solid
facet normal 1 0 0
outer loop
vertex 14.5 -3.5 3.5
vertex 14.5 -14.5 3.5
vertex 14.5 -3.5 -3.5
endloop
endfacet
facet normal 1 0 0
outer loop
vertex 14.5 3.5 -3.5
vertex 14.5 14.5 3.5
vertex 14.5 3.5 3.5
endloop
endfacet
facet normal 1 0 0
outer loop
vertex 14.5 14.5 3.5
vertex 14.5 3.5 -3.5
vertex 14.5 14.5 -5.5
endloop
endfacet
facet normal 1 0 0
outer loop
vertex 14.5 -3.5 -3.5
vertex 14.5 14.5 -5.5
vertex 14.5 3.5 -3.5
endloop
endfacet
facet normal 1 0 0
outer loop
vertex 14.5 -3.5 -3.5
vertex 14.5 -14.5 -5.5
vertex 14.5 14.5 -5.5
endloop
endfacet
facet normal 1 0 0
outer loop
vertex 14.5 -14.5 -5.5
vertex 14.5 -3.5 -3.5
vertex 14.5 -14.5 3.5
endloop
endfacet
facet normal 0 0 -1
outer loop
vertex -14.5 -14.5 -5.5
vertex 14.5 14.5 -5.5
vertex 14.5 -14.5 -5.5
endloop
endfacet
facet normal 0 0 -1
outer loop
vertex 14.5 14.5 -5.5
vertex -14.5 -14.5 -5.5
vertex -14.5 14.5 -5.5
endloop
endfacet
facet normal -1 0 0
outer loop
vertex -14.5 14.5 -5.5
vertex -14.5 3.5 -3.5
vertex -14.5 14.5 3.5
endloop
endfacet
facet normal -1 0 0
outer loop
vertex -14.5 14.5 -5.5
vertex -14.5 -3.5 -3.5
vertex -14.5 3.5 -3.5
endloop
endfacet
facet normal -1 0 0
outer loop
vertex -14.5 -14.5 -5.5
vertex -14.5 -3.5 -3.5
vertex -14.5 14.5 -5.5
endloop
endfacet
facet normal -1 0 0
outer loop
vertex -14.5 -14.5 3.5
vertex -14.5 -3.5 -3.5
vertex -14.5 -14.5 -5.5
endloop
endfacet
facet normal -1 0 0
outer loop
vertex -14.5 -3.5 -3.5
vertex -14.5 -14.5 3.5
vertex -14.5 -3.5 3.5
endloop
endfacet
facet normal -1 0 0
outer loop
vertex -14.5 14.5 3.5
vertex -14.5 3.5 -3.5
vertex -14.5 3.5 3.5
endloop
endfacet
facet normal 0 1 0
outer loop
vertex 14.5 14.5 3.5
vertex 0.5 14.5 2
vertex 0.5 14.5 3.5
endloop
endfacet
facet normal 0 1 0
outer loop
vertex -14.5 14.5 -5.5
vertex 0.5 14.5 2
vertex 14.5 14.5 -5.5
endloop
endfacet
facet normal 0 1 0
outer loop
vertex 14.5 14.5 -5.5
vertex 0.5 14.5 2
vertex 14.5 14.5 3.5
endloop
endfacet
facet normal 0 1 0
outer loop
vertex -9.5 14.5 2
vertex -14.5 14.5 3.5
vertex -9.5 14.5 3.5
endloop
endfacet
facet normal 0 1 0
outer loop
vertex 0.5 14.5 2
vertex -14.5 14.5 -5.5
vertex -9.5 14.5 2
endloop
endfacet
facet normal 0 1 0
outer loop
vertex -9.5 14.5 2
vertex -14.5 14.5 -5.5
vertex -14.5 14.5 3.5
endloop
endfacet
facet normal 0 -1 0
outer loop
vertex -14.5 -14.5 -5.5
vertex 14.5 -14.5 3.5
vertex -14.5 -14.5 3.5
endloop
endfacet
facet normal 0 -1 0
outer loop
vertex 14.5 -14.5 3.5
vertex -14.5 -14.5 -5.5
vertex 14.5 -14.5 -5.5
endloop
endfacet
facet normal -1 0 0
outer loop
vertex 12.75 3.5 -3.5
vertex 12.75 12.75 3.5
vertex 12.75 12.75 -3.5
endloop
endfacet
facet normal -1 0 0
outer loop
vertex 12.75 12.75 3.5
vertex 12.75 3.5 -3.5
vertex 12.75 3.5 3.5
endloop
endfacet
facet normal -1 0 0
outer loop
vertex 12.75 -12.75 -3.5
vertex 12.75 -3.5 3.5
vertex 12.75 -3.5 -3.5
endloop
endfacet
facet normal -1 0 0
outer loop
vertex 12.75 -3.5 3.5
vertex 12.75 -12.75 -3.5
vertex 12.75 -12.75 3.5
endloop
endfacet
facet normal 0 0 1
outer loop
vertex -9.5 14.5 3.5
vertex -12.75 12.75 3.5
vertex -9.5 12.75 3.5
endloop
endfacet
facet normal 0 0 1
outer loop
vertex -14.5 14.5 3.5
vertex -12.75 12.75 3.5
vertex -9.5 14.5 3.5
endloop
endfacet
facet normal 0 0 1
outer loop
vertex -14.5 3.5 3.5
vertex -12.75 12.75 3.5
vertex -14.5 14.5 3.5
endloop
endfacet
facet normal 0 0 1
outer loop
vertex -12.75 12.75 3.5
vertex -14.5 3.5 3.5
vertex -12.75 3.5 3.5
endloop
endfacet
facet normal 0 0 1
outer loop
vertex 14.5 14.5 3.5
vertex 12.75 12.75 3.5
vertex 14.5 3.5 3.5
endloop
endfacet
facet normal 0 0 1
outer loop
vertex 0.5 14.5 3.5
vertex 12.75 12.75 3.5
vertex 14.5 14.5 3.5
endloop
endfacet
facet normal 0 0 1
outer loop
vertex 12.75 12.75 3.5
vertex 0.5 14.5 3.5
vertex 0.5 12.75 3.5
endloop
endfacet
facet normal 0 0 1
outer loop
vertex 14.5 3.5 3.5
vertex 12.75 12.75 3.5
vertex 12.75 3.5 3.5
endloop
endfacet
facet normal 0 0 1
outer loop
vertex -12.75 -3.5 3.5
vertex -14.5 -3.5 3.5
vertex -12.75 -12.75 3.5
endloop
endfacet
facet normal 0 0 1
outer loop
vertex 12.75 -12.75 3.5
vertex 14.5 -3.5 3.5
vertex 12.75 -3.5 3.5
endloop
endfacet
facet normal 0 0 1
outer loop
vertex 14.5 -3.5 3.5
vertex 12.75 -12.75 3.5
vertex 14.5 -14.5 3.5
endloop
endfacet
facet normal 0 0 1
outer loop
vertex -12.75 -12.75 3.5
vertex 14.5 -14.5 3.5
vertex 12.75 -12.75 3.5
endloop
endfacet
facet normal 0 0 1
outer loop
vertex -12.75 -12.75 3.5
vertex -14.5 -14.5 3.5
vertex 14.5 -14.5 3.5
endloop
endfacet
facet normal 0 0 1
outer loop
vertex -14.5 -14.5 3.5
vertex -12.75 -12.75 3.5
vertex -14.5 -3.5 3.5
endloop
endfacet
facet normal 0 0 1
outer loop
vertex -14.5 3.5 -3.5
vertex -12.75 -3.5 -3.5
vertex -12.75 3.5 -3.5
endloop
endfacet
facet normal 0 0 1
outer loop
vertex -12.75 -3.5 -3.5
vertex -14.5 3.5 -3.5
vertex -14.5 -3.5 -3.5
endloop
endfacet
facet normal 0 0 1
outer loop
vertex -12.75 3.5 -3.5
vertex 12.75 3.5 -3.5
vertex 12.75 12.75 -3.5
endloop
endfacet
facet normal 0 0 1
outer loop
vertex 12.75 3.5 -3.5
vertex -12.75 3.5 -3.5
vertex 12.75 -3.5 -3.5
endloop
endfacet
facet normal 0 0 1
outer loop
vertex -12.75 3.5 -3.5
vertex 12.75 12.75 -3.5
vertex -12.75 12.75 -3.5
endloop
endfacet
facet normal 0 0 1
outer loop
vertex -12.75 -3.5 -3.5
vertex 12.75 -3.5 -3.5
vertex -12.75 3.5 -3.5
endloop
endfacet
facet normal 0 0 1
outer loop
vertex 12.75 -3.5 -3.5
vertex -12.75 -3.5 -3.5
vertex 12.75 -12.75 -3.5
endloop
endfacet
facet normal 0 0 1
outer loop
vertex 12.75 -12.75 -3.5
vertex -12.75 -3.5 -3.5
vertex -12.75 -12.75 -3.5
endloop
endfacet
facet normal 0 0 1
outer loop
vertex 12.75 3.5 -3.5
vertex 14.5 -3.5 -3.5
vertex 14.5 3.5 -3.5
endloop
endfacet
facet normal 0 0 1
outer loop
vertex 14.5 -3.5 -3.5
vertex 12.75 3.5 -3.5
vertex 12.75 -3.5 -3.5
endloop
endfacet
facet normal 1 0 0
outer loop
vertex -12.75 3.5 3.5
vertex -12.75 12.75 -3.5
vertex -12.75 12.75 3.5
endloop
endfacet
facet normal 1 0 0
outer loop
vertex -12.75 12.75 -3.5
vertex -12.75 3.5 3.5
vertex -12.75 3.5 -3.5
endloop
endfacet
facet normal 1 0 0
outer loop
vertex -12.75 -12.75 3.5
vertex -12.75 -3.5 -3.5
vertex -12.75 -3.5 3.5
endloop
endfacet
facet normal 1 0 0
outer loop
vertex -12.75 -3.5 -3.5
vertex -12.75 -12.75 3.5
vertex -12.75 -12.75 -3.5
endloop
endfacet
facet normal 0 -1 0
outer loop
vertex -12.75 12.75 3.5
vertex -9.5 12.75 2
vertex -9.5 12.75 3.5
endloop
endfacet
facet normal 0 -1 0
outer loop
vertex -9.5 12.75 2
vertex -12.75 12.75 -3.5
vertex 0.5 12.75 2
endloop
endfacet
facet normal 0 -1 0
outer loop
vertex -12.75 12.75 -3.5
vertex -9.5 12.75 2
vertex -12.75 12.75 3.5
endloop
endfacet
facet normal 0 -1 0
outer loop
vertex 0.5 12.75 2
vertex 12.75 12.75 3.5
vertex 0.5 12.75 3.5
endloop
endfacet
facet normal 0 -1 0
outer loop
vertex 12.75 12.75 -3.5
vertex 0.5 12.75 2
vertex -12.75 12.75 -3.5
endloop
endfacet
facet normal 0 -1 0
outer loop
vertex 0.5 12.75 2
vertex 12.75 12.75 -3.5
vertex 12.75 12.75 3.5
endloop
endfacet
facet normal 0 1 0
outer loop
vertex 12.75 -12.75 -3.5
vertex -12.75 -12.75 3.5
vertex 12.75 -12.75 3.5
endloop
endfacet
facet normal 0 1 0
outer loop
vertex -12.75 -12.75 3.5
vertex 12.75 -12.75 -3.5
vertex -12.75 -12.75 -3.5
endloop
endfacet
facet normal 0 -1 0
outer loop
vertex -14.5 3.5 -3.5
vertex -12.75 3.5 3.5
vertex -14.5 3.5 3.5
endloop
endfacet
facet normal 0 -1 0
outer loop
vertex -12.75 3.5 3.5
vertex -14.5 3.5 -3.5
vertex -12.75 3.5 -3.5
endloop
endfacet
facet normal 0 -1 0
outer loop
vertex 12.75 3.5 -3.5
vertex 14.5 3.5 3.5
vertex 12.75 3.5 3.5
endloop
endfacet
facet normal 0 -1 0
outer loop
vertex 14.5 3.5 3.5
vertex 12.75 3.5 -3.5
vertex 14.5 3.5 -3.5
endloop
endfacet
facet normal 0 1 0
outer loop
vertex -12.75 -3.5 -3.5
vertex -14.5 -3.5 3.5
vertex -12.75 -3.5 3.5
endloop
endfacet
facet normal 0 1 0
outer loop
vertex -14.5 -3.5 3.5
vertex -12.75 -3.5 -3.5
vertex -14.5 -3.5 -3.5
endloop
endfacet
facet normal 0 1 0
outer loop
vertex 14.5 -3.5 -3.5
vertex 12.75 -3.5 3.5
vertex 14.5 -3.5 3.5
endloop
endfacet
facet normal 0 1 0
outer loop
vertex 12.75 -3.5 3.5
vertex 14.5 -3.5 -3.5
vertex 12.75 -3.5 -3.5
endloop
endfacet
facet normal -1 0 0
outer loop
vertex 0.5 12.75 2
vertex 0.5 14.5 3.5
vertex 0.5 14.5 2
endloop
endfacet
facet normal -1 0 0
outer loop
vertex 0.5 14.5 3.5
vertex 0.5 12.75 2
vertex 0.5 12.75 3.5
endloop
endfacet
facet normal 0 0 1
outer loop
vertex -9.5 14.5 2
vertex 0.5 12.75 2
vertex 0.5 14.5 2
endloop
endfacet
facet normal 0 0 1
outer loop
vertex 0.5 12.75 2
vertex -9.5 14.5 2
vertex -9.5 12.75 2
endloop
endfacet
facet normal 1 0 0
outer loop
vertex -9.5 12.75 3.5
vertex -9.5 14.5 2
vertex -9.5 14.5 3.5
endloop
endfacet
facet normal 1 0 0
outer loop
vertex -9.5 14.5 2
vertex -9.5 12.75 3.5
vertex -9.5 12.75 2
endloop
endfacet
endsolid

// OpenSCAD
// SatNOGS LNA housing

module outer() {
	cube([29,29,11], center=true);
}

module inner() {
	cube([25.5,25.5,7], center=true);
}

module sma_hole() {
	cube([30,7,7], center=true);
}

module power_hole() {
	translate([-4.5,12.5,6])
		cube([10,7,8], center=true);
}

module scrapping_top() {
	translate([0,0,7])
		cube([30,30,7], center=true);
}

module scrapping_bottom() {
	translate([0,0,-1.5])
		cube([30,30,10], center=true);
}

module nog() {
	cube([2,2,3], center=true);
}

union() {
	difference() {
		outer();
		inner();
		sma_hole();
		power_hole();
		scrapping_top();
		//scrapping_bottom();
	}
	//translate([11.75,11.75,2.5])
		//nog();
	//translate([-11.75,-11.75,2.5])
		//nog();
}
